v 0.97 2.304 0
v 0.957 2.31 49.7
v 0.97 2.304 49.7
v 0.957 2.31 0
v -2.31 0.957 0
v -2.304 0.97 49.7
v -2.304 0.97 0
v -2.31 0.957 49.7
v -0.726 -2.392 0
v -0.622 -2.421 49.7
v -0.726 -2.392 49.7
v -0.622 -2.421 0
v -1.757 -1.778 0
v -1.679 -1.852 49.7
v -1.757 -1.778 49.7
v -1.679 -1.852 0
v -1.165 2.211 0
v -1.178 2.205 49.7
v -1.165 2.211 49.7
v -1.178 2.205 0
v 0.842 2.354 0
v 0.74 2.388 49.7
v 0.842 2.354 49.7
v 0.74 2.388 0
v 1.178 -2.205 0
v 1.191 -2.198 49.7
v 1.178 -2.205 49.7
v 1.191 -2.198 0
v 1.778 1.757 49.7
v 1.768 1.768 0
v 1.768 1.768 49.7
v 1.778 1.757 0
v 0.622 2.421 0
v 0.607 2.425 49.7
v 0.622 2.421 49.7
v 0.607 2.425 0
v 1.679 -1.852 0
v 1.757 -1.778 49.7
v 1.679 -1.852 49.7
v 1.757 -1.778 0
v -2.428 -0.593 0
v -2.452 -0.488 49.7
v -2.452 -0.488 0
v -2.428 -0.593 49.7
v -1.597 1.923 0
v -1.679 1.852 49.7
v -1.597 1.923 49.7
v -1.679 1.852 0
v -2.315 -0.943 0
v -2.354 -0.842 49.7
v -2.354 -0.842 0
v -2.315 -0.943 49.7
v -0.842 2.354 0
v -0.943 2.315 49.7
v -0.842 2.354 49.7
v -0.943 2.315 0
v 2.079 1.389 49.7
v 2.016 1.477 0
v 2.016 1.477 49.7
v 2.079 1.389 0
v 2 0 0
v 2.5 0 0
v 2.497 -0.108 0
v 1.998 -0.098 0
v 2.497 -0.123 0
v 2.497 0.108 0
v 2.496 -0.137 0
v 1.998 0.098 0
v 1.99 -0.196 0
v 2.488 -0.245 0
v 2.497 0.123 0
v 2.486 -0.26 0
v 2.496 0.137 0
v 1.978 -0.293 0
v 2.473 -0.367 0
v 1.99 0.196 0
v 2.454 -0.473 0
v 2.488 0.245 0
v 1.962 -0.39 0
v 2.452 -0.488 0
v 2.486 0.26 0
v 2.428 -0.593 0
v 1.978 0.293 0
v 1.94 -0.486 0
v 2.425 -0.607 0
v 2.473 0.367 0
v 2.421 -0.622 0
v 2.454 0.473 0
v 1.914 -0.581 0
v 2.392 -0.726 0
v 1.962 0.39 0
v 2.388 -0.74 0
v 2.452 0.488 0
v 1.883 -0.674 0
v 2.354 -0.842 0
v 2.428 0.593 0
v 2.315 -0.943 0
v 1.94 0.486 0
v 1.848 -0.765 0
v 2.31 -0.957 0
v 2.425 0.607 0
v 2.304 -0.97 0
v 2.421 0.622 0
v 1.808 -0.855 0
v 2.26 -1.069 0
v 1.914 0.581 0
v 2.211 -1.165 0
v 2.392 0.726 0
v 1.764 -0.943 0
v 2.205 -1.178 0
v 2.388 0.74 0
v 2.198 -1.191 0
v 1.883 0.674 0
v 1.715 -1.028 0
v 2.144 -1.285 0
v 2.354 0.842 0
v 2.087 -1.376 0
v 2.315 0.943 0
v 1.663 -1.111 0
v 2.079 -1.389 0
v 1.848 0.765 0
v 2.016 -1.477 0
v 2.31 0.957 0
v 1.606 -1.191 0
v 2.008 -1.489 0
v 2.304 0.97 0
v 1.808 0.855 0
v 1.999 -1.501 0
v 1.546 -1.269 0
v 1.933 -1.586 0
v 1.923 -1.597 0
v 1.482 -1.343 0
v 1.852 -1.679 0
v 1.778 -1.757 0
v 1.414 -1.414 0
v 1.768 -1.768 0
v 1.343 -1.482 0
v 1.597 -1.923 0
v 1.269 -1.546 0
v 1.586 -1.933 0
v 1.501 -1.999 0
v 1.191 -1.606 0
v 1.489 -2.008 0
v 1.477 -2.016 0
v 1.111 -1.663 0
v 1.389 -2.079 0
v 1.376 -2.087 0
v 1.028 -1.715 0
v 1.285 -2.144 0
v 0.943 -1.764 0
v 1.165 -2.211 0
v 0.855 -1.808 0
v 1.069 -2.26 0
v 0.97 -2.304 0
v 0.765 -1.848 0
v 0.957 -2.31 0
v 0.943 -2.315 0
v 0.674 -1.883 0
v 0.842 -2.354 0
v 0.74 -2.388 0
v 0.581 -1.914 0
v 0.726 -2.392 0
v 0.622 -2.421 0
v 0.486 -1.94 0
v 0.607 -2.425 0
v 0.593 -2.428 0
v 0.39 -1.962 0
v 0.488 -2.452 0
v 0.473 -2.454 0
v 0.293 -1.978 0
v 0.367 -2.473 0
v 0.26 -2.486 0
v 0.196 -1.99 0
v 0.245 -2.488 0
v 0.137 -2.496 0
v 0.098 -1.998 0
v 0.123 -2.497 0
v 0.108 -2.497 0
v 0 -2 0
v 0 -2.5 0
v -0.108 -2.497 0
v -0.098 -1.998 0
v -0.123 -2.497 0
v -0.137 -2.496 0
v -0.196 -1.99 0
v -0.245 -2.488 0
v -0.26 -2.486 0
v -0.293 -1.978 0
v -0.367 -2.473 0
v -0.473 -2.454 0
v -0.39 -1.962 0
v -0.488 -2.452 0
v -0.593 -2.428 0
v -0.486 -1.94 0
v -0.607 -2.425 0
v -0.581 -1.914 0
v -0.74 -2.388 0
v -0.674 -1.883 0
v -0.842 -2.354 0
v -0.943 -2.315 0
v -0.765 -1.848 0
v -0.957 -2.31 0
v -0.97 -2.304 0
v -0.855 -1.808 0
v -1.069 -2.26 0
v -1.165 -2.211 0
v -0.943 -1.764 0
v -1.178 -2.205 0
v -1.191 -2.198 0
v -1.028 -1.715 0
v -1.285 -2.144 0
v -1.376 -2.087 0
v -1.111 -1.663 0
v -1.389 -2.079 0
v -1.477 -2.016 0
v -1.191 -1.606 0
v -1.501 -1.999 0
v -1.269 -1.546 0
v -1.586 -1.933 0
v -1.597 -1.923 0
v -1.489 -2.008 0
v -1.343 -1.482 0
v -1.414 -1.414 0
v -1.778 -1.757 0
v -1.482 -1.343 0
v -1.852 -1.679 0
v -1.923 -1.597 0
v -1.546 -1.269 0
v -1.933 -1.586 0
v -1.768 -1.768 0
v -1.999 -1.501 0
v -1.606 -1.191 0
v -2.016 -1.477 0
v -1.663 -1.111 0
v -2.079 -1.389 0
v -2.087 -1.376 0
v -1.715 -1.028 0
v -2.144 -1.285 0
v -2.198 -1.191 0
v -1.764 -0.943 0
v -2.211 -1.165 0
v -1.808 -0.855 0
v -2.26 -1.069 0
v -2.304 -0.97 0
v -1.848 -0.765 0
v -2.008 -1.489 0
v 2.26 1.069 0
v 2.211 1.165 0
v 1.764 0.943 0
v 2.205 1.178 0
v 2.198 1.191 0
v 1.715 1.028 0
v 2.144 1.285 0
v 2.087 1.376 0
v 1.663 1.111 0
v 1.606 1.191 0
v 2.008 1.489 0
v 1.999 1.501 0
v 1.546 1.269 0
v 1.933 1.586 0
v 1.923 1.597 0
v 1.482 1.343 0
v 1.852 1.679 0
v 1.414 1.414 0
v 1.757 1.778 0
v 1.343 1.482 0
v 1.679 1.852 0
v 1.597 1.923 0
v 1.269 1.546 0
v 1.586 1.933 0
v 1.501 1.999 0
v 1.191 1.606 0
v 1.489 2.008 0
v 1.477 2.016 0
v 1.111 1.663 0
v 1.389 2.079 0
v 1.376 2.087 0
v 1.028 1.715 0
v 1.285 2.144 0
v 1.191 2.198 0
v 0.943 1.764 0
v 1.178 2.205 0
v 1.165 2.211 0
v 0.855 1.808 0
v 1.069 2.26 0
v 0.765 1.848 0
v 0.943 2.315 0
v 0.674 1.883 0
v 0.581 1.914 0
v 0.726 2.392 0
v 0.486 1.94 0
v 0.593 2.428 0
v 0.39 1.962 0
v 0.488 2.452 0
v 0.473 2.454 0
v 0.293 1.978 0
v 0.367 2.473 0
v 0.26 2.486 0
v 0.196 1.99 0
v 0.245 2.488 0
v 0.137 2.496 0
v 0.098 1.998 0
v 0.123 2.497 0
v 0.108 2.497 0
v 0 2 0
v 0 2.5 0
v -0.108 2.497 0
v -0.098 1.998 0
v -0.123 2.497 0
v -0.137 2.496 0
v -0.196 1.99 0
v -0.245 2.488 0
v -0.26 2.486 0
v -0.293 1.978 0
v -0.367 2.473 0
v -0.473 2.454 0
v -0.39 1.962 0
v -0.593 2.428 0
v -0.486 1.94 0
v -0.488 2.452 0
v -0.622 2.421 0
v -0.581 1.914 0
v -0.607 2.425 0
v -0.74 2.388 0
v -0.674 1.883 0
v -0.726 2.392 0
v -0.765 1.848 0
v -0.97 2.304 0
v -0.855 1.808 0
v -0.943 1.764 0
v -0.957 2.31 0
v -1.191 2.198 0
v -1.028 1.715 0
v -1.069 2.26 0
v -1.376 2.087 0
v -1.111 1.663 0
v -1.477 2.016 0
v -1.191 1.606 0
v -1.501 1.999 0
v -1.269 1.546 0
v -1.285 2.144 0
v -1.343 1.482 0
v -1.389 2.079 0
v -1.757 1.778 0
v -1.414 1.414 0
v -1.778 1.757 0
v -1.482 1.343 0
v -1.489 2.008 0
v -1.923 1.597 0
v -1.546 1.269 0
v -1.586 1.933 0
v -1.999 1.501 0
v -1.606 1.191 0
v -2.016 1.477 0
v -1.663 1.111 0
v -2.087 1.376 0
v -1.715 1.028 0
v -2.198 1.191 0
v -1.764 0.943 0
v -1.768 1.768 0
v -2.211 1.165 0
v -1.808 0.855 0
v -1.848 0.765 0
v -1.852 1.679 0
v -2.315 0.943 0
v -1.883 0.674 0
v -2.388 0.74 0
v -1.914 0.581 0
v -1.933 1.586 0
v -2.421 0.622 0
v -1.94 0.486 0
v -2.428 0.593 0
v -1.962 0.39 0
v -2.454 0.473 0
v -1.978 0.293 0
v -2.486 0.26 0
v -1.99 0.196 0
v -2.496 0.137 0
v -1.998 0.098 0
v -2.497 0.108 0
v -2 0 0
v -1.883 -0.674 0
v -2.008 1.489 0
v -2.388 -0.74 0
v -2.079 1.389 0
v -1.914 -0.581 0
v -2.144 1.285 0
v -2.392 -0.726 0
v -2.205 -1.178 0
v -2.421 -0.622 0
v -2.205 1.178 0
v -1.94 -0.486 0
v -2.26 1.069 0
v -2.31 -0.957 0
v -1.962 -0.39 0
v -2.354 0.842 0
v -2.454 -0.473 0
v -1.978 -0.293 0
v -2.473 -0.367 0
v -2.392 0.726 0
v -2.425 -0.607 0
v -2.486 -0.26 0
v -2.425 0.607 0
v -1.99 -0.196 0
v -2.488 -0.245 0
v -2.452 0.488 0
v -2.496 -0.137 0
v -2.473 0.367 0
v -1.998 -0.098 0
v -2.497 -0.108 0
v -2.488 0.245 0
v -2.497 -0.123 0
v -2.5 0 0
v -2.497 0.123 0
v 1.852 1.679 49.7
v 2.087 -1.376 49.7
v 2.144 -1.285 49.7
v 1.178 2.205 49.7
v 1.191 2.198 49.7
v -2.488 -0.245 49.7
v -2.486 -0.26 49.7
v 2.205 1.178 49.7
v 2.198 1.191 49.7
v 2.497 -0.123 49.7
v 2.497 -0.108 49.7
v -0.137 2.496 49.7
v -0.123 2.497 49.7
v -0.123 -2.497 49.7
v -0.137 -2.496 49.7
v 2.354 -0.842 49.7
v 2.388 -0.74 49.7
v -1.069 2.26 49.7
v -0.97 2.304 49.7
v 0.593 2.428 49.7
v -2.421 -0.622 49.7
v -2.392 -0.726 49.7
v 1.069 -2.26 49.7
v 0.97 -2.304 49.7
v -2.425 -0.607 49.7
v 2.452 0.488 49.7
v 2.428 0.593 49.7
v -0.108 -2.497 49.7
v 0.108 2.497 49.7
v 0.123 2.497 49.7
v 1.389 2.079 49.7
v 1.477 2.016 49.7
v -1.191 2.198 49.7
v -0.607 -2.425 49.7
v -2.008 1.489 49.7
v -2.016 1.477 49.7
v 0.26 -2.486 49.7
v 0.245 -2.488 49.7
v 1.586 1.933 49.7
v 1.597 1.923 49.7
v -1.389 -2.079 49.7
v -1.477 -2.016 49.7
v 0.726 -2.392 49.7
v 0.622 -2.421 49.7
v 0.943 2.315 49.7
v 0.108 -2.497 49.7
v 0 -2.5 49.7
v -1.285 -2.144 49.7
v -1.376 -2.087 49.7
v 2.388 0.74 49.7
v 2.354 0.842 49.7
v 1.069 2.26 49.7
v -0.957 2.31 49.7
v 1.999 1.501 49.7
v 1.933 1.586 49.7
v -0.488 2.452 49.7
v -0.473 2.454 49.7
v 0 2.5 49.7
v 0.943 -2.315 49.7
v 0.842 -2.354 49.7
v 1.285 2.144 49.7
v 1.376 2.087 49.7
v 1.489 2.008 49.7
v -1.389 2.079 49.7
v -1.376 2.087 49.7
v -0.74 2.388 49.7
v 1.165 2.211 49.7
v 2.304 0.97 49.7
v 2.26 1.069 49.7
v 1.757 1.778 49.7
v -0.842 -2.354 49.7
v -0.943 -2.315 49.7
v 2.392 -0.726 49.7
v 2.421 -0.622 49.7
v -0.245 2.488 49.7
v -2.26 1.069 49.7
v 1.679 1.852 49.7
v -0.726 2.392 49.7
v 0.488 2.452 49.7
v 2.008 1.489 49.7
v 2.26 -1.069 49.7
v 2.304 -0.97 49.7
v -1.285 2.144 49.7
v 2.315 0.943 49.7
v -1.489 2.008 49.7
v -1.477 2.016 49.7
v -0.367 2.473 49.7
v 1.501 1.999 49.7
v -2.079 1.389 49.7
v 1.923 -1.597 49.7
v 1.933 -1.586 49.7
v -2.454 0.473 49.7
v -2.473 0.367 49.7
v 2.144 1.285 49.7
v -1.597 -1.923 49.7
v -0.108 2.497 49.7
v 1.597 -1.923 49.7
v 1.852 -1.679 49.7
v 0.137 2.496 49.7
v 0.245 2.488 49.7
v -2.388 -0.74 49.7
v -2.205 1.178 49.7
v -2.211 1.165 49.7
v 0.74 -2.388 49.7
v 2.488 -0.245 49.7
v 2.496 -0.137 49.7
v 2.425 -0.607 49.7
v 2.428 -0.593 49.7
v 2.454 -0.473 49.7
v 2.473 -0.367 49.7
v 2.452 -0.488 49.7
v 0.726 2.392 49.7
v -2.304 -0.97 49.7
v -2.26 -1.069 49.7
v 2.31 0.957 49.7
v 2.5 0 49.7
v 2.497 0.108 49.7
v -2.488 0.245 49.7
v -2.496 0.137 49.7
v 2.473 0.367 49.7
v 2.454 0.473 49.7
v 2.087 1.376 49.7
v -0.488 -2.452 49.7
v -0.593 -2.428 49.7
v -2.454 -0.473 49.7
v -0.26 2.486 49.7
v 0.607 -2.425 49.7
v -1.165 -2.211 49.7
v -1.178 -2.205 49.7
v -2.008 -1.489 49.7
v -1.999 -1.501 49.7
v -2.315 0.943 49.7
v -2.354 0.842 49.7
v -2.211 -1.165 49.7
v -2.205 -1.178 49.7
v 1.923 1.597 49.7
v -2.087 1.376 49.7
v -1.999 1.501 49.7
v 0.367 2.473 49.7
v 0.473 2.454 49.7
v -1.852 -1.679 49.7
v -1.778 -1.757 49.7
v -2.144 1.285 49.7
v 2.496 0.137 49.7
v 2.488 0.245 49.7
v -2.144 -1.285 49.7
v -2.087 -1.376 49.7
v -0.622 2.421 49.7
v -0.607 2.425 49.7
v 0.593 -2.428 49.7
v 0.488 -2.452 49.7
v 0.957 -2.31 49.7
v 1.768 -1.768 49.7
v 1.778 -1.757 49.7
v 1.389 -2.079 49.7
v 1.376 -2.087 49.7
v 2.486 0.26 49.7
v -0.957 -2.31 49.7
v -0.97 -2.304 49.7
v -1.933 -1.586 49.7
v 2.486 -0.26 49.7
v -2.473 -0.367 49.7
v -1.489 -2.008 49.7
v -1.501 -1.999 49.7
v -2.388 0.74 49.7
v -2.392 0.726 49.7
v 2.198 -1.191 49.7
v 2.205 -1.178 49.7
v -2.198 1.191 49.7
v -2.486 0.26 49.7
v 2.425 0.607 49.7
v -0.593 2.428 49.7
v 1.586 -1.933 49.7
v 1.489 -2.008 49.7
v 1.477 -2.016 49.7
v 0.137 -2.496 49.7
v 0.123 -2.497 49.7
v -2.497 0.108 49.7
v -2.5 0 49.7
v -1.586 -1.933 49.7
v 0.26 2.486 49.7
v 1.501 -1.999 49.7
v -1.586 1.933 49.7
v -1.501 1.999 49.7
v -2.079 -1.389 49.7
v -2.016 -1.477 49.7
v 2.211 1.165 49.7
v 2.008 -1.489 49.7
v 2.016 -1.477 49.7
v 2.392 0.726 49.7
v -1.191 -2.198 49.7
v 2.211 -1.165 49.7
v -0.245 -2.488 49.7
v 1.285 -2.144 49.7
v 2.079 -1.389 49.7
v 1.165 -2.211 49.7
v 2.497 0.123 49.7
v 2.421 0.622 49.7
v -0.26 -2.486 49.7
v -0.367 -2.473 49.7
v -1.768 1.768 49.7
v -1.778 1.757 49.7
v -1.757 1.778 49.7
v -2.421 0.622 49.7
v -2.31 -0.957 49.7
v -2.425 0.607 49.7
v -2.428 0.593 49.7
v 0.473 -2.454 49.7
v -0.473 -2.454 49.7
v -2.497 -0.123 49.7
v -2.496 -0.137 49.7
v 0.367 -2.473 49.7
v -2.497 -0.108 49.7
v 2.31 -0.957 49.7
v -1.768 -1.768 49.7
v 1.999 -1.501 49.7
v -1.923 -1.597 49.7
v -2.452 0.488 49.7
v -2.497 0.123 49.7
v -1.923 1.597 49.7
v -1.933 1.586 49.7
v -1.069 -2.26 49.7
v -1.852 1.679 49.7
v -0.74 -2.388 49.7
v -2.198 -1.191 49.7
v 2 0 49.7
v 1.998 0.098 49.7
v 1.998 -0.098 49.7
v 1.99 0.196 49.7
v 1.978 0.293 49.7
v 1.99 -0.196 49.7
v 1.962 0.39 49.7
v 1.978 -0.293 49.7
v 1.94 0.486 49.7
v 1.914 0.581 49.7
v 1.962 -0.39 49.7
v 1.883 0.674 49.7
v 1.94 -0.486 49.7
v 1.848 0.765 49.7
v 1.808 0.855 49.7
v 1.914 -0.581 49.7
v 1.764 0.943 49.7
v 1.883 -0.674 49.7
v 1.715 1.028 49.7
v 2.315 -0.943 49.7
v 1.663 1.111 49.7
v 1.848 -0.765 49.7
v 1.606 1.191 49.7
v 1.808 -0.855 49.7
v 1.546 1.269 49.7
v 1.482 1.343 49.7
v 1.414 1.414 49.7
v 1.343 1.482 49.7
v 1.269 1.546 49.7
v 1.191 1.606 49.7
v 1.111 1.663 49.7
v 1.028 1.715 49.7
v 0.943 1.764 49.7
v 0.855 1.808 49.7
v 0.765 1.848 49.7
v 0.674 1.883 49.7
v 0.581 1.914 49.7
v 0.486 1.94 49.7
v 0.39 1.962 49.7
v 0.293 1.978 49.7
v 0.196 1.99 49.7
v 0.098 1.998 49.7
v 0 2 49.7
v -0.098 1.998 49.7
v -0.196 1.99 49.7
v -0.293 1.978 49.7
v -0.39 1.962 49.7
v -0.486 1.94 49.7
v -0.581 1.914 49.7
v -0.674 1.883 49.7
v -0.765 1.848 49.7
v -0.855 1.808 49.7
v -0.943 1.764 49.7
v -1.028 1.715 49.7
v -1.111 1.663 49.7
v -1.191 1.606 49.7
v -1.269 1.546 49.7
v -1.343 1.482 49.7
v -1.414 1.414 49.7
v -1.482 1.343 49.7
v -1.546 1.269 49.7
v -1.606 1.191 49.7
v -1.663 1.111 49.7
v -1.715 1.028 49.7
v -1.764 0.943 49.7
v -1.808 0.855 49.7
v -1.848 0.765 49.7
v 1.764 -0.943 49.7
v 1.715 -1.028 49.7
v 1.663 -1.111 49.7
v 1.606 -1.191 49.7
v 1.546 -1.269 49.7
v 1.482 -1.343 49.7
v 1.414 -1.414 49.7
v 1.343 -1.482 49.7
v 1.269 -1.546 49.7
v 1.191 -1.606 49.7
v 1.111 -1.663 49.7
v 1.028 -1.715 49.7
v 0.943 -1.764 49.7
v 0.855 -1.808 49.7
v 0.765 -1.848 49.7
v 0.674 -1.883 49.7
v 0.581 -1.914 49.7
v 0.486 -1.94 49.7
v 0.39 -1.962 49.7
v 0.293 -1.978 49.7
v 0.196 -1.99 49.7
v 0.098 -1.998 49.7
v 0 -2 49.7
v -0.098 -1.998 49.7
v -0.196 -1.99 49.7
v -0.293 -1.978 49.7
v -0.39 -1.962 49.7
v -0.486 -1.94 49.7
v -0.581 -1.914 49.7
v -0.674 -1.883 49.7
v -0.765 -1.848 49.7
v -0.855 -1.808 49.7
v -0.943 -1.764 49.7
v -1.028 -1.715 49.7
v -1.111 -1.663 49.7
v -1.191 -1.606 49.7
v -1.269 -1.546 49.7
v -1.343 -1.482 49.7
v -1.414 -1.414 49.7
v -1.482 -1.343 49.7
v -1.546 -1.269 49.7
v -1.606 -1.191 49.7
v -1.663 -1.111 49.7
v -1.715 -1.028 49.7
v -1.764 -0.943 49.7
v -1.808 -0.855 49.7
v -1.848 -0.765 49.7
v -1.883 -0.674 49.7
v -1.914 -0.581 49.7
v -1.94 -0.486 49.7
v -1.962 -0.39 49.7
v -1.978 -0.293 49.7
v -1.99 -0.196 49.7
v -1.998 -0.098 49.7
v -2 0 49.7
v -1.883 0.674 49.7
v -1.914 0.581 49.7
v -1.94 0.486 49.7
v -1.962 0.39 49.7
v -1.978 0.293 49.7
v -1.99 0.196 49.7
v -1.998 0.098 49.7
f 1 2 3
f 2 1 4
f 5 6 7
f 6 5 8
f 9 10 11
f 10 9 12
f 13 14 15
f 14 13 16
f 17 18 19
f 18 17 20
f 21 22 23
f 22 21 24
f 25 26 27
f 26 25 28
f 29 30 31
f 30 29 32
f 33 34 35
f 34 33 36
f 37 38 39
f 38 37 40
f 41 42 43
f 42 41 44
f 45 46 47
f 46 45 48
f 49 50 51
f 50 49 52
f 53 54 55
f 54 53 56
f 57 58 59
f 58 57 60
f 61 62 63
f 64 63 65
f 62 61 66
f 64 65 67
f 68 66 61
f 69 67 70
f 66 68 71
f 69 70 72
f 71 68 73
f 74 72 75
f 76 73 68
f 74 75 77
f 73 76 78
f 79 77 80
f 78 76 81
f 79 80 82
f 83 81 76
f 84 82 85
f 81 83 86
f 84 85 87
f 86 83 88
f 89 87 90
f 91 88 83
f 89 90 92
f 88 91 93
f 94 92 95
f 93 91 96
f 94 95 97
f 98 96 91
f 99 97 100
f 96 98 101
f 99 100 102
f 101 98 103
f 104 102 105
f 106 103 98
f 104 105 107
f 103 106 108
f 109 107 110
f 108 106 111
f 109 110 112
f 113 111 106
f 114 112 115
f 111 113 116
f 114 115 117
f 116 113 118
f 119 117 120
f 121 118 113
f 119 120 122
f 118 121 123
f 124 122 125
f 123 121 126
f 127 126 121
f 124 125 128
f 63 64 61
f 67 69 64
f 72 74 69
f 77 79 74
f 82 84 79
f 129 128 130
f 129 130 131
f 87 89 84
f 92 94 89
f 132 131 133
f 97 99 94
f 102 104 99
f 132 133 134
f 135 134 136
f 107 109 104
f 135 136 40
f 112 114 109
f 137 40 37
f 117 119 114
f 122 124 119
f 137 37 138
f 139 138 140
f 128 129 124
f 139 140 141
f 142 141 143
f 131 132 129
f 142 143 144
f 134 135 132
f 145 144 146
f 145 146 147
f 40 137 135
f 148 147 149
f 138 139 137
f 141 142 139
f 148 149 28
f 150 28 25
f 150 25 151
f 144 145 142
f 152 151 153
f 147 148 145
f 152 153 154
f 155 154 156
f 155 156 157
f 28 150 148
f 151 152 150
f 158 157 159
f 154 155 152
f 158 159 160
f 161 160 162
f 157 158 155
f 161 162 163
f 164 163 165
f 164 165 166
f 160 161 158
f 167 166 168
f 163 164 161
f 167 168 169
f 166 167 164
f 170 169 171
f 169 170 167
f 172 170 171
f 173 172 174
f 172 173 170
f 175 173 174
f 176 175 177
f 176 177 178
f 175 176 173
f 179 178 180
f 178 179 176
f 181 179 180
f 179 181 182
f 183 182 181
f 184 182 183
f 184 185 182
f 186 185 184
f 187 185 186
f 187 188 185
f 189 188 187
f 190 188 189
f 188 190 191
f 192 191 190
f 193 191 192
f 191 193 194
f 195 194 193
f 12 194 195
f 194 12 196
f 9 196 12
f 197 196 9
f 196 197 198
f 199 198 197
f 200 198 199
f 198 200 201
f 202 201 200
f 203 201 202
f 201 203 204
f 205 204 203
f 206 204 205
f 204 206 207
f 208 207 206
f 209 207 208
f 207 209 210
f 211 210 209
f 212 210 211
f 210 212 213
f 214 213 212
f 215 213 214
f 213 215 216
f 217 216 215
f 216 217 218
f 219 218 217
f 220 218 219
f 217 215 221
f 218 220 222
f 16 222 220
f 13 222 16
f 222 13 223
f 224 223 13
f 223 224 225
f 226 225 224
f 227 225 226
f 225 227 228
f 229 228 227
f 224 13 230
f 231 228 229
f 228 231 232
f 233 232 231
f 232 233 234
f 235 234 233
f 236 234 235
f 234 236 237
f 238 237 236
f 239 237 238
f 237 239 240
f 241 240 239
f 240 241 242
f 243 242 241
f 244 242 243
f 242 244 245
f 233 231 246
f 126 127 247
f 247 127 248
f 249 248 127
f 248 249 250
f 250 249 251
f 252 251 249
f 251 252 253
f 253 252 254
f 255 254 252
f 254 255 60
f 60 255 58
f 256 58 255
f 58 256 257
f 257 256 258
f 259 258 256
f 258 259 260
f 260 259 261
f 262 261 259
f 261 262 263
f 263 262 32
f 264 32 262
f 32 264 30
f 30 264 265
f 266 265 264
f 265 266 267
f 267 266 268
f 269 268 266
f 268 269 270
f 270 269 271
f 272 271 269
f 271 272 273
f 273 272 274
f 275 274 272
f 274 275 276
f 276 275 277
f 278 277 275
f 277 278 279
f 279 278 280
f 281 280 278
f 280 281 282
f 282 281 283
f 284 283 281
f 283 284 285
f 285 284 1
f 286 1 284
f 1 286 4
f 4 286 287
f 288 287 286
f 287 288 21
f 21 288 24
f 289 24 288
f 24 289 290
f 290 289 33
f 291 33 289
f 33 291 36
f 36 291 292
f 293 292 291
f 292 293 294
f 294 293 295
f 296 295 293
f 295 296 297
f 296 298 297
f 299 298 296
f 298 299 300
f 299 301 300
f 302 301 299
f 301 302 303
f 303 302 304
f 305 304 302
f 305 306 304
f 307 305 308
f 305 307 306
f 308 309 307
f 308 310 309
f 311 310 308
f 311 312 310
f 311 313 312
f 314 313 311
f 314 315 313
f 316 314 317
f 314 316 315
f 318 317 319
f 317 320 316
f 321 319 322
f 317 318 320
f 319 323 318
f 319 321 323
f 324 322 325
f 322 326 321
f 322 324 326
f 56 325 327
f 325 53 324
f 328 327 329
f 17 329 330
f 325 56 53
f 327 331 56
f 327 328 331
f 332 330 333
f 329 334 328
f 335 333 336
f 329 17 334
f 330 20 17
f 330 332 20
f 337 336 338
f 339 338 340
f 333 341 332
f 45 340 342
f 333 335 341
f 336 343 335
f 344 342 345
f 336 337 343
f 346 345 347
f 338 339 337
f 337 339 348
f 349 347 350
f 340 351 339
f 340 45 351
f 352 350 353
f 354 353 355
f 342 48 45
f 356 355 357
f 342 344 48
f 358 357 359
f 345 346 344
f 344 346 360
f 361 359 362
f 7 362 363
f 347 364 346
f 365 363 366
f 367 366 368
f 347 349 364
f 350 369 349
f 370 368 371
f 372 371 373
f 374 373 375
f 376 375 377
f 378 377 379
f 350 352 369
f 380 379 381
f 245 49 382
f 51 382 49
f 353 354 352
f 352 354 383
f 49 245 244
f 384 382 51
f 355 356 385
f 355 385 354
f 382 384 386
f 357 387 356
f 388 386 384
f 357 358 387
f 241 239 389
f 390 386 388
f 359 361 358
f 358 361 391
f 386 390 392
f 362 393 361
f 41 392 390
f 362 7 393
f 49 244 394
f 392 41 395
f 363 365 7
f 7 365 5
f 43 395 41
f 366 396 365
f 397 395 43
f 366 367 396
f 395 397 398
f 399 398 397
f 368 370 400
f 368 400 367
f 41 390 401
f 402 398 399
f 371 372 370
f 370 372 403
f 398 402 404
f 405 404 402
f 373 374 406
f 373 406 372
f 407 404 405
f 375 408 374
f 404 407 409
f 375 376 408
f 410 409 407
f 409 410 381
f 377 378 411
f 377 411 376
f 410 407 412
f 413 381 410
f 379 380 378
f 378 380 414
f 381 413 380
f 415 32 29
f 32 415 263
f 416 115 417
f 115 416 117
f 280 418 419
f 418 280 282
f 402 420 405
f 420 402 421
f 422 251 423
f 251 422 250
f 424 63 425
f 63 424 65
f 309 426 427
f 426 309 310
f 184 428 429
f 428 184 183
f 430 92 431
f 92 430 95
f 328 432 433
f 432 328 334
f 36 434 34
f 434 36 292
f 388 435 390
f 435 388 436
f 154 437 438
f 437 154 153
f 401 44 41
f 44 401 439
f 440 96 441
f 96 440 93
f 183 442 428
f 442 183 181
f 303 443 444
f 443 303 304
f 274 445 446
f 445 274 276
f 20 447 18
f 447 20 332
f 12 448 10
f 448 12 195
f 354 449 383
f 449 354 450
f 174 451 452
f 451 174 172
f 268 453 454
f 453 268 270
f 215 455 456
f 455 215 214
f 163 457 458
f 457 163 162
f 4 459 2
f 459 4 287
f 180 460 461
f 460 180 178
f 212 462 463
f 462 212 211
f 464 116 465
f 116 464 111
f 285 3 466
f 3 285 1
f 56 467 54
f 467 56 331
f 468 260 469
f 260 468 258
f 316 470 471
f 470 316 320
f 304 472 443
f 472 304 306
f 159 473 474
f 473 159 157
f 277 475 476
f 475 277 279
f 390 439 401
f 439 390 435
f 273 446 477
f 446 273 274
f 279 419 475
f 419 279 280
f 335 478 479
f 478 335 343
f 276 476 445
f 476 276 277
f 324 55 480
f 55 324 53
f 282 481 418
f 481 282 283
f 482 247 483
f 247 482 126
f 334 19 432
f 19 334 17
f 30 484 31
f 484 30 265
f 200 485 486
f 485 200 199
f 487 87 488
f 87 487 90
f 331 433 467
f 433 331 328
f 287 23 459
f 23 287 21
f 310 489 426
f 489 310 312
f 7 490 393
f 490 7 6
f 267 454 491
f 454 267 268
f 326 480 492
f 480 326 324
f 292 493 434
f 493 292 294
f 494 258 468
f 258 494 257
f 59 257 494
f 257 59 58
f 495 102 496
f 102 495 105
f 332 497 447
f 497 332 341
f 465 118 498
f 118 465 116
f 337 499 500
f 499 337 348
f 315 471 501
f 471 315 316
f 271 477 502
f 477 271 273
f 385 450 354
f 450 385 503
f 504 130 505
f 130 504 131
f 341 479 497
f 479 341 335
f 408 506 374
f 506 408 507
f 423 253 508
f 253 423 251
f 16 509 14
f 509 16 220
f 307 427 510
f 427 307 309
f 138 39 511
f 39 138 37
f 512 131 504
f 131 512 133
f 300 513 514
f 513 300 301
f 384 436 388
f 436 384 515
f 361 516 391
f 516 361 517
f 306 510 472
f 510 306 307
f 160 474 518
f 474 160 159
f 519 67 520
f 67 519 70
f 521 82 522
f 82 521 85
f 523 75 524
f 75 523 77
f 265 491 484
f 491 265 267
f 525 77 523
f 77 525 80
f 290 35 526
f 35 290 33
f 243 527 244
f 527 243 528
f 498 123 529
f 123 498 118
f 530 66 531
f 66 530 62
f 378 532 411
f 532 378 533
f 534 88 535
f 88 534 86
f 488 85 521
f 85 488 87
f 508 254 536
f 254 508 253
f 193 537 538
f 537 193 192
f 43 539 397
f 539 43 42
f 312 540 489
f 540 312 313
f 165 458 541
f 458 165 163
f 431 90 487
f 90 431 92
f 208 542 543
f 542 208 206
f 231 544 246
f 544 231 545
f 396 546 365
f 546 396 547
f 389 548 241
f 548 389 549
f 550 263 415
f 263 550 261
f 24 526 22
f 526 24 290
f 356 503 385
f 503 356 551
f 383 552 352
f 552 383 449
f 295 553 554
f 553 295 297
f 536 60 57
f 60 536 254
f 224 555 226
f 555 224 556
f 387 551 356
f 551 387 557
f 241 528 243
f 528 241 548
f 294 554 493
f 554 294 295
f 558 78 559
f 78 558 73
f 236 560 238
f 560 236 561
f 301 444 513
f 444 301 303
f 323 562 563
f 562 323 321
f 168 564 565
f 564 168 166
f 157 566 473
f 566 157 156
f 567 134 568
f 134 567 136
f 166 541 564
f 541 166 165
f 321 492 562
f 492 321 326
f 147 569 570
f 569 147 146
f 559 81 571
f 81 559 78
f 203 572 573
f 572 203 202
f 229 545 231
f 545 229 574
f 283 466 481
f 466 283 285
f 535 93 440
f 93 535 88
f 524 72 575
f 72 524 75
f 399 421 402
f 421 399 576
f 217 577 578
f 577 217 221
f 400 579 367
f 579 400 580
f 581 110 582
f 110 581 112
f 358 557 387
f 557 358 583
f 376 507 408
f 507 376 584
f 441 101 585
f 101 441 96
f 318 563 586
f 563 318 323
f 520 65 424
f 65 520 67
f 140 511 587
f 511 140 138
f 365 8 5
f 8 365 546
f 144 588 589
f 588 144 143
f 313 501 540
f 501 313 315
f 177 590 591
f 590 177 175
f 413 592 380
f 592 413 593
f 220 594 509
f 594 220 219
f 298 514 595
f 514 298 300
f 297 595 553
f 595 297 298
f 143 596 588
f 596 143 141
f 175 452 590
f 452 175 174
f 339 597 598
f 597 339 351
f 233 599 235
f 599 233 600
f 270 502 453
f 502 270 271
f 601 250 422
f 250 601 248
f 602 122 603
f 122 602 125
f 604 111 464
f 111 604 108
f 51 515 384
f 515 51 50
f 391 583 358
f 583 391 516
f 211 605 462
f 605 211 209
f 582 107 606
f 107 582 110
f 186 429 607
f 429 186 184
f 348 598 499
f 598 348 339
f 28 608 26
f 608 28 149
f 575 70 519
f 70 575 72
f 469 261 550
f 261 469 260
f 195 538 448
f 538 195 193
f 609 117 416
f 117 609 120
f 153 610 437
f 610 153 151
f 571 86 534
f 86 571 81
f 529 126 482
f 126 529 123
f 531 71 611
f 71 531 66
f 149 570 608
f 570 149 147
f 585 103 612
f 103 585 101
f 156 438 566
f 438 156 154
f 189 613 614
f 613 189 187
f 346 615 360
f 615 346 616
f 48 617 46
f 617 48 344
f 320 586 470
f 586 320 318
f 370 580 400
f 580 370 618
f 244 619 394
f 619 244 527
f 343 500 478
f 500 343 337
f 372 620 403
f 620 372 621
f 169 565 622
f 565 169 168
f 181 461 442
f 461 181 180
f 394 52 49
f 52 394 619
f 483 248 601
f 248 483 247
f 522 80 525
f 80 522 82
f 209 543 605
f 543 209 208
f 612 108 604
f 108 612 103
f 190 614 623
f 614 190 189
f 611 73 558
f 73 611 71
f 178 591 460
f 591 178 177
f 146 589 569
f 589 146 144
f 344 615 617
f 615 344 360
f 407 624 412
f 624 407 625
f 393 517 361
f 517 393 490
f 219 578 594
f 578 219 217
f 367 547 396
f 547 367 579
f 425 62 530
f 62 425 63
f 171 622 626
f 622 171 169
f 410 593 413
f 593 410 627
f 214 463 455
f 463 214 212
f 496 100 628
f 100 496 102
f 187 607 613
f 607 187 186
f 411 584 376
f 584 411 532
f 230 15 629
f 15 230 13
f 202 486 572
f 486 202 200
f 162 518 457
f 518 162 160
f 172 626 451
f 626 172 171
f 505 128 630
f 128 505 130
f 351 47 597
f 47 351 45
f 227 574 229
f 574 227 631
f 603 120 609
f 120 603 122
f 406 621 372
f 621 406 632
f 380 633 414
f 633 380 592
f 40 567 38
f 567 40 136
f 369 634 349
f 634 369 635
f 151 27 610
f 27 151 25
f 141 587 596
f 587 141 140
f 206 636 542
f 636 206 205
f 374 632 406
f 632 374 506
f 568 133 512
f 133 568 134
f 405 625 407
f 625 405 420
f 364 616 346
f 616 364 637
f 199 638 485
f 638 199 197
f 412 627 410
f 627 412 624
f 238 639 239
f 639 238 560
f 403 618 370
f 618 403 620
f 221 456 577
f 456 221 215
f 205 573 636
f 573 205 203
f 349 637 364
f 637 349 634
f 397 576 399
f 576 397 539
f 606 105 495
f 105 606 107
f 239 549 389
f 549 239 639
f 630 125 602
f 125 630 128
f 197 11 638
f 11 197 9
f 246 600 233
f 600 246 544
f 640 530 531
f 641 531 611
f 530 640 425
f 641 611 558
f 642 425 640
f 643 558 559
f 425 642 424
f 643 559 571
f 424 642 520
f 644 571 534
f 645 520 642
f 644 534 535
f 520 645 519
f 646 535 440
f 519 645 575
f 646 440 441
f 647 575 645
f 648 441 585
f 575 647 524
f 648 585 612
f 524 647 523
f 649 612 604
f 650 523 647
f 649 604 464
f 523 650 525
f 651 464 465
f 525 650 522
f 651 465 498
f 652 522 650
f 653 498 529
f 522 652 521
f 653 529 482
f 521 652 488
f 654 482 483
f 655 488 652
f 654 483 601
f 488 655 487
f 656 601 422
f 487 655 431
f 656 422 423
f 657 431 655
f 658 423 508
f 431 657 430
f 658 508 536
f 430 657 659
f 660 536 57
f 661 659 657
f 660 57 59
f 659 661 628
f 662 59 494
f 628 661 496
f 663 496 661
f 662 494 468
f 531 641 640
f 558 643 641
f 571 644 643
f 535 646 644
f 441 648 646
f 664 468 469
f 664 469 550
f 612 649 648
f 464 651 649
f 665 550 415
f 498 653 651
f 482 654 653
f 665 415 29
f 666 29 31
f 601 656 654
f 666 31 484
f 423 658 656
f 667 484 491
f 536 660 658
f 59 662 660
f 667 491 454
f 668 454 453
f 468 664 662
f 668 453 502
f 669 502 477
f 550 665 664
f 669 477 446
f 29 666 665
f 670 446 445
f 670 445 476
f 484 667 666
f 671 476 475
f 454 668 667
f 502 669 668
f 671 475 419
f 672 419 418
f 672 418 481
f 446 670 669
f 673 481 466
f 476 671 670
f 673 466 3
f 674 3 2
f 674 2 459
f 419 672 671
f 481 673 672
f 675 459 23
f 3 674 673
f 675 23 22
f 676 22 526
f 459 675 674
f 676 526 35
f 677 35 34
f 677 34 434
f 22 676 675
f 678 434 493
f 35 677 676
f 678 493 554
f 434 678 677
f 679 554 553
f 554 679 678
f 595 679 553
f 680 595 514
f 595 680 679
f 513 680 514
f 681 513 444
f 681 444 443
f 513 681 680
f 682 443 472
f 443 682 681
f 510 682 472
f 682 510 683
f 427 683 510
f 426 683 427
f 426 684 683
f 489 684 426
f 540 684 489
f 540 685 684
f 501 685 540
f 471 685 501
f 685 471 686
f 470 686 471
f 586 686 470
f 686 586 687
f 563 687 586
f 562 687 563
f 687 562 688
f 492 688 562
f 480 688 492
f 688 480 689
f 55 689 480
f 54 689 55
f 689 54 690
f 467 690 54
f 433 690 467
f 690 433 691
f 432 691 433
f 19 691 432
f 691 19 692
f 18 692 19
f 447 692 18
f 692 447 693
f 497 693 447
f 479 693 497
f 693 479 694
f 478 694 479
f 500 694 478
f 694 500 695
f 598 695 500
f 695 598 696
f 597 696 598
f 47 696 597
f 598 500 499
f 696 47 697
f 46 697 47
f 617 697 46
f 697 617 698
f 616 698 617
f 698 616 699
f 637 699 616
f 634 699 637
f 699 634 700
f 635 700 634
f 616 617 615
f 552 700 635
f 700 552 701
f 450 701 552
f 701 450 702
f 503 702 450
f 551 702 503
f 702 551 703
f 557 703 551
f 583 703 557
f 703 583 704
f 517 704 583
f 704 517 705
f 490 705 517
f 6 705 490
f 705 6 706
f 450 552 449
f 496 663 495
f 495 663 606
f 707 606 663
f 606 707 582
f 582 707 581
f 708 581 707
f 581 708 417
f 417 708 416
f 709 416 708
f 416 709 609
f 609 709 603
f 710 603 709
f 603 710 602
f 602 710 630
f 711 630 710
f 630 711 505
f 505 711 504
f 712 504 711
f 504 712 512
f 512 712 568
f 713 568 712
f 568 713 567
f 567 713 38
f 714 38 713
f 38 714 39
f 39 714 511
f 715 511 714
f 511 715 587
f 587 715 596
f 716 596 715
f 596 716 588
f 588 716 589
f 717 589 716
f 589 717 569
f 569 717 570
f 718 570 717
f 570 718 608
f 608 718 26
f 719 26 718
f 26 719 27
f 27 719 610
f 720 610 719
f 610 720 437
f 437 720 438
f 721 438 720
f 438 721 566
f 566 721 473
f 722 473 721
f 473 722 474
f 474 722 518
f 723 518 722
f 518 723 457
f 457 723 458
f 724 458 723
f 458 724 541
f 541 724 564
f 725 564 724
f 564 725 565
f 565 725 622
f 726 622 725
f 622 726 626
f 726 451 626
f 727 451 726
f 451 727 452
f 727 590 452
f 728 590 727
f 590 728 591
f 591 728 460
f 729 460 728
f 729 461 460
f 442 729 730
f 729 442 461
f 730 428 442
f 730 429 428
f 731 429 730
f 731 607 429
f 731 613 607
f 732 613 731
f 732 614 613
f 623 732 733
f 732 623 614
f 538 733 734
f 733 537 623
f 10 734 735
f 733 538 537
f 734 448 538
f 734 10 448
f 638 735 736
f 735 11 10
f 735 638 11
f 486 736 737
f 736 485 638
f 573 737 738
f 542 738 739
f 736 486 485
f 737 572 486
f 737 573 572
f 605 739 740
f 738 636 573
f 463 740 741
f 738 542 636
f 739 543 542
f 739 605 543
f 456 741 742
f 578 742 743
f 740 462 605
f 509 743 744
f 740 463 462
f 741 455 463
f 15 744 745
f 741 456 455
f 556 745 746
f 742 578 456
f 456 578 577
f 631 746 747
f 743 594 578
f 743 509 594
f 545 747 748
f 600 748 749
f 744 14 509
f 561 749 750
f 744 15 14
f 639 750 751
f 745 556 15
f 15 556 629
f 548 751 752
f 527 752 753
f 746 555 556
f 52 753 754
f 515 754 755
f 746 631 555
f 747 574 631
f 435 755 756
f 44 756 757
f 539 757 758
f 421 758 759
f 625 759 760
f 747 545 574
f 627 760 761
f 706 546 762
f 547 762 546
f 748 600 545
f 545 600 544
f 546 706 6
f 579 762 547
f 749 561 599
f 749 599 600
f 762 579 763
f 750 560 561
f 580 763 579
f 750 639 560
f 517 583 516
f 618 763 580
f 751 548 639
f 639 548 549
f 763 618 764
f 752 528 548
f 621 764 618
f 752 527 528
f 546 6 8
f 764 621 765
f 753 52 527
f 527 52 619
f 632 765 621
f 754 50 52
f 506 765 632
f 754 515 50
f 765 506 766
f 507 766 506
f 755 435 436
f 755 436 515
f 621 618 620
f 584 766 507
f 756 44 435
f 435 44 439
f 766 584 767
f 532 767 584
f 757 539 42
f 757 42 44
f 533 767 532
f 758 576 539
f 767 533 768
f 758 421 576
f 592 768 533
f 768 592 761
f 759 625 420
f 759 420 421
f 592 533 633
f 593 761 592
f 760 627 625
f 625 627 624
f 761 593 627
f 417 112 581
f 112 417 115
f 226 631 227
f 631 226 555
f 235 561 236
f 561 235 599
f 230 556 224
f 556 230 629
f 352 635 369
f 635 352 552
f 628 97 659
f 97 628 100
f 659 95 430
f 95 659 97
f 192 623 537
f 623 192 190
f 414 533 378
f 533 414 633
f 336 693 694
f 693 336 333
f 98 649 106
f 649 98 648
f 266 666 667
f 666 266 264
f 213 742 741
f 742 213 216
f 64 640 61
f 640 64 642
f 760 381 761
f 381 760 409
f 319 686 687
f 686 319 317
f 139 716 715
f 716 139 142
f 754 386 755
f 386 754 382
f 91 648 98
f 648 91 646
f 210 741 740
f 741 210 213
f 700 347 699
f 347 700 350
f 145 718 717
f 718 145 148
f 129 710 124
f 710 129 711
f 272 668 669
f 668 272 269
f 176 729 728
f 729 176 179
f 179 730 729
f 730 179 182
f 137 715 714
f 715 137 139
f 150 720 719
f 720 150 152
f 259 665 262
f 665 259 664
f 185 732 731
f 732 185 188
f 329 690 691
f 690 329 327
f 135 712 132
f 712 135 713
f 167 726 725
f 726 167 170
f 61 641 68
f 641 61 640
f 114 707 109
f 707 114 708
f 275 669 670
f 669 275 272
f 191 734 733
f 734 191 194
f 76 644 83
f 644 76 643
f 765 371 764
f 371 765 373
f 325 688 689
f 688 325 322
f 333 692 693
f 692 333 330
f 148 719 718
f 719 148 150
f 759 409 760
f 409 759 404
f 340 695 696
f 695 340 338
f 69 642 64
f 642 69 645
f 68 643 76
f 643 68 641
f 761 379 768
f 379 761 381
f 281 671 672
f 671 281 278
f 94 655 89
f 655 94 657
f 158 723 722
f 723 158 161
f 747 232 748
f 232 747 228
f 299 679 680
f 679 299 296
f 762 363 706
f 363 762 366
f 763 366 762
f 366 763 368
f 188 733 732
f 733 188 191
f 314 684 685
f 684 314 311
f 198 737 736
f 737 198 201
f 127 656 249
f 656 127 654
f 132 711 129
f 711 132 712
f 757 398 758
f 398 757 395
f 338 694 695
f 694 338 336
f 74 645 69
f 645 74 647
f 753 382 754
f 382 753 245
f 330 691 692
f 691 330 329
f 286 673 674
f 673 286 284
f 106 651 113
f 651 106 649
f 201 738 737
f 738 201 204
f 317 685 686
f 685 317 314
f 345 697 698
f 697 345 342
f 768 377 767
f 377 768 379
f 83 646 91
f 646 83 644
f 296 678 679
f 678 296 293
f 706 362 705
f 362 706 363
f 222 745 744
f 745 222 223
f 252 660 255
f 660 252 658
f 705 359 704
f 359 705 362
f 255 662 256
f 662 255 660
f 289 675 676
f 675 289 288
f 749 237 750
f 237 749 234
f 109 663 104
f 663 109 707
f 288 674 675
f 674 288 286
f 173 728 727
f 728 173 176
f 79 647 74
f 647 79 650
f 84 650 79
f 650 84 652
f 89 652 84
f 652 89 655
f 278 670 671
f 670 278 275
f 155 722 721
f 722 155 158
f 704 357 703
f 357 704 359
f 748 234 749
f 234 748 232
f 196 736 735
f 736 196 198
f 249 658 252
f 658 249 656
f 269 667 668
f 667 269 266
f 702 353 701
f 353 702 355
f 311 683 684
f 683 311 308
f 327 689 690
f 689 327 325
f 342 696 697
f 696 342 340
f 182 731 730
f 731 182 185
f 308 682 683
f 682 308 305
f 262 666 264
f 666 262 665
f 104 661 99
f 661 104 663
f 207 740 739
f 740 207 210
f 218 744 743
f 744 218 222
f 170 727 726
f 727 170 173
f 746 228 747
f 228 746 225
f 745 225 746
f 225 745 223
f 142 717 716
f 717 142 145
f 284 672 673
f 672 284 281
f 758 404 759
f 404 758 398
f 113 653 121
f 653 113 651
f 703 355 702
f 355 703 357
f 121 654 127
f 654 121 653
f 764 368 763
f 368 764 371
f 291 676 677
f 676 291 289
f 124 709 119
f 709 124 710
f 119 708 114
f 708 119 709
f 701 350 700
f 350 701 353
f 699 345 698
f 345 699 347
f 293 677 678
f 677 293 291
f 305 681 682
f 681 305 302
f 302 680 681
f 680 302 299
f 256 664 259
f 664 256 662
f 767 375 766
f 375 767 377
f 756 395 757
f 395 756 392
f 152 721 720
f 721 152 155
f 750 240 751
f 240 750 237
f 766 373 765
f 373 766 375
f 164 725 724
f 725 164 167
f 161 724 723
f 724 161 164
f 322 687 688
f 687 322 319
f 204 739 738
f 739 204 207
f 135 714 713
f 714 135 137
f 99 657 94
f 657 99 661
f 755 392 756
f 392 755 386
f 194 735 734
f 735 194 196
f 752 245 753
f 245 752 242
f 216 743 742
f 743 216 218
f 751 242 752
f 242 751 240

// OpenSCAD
$fn = 128;

// PTFE heatshrink sleeving (simple hollow tube model)
// Units: mm

// Parameters
length = 50;          // overall length
id = 4.0;             // inner diameter
wall = 0.5;           // wall thickness
od = id + 2*wall;     // outer diameter

// Optional: slight end chamfer to mimic cut tubing
chamfer = 0.3;        // set to 0 for square ends

module tube(L, ID, OD, chamfer=0) {
    r_in = ID/2;
    r_out = OD/2;

    difference() {
        // Outer body with optional chamfer
        if (chamfer > 0) {
            minkowski() {
                cylinder(h = max(0.01, L - 2*chamfer), r = r_out - chamfer, center = false);
                cylinder(h = chamfer, r = chamfer, center = false);
            }
        } else {
            cylinder(h = L, r = r_out, center = false);
        }

        // Inner bore (extend slightly to ensure clean subtraction)
        translate([0,0,-0.5])
            cylinder(h = L + 1.0, r = r_in, center = false);
    }
}

tube(length, id, od, chamfer);
